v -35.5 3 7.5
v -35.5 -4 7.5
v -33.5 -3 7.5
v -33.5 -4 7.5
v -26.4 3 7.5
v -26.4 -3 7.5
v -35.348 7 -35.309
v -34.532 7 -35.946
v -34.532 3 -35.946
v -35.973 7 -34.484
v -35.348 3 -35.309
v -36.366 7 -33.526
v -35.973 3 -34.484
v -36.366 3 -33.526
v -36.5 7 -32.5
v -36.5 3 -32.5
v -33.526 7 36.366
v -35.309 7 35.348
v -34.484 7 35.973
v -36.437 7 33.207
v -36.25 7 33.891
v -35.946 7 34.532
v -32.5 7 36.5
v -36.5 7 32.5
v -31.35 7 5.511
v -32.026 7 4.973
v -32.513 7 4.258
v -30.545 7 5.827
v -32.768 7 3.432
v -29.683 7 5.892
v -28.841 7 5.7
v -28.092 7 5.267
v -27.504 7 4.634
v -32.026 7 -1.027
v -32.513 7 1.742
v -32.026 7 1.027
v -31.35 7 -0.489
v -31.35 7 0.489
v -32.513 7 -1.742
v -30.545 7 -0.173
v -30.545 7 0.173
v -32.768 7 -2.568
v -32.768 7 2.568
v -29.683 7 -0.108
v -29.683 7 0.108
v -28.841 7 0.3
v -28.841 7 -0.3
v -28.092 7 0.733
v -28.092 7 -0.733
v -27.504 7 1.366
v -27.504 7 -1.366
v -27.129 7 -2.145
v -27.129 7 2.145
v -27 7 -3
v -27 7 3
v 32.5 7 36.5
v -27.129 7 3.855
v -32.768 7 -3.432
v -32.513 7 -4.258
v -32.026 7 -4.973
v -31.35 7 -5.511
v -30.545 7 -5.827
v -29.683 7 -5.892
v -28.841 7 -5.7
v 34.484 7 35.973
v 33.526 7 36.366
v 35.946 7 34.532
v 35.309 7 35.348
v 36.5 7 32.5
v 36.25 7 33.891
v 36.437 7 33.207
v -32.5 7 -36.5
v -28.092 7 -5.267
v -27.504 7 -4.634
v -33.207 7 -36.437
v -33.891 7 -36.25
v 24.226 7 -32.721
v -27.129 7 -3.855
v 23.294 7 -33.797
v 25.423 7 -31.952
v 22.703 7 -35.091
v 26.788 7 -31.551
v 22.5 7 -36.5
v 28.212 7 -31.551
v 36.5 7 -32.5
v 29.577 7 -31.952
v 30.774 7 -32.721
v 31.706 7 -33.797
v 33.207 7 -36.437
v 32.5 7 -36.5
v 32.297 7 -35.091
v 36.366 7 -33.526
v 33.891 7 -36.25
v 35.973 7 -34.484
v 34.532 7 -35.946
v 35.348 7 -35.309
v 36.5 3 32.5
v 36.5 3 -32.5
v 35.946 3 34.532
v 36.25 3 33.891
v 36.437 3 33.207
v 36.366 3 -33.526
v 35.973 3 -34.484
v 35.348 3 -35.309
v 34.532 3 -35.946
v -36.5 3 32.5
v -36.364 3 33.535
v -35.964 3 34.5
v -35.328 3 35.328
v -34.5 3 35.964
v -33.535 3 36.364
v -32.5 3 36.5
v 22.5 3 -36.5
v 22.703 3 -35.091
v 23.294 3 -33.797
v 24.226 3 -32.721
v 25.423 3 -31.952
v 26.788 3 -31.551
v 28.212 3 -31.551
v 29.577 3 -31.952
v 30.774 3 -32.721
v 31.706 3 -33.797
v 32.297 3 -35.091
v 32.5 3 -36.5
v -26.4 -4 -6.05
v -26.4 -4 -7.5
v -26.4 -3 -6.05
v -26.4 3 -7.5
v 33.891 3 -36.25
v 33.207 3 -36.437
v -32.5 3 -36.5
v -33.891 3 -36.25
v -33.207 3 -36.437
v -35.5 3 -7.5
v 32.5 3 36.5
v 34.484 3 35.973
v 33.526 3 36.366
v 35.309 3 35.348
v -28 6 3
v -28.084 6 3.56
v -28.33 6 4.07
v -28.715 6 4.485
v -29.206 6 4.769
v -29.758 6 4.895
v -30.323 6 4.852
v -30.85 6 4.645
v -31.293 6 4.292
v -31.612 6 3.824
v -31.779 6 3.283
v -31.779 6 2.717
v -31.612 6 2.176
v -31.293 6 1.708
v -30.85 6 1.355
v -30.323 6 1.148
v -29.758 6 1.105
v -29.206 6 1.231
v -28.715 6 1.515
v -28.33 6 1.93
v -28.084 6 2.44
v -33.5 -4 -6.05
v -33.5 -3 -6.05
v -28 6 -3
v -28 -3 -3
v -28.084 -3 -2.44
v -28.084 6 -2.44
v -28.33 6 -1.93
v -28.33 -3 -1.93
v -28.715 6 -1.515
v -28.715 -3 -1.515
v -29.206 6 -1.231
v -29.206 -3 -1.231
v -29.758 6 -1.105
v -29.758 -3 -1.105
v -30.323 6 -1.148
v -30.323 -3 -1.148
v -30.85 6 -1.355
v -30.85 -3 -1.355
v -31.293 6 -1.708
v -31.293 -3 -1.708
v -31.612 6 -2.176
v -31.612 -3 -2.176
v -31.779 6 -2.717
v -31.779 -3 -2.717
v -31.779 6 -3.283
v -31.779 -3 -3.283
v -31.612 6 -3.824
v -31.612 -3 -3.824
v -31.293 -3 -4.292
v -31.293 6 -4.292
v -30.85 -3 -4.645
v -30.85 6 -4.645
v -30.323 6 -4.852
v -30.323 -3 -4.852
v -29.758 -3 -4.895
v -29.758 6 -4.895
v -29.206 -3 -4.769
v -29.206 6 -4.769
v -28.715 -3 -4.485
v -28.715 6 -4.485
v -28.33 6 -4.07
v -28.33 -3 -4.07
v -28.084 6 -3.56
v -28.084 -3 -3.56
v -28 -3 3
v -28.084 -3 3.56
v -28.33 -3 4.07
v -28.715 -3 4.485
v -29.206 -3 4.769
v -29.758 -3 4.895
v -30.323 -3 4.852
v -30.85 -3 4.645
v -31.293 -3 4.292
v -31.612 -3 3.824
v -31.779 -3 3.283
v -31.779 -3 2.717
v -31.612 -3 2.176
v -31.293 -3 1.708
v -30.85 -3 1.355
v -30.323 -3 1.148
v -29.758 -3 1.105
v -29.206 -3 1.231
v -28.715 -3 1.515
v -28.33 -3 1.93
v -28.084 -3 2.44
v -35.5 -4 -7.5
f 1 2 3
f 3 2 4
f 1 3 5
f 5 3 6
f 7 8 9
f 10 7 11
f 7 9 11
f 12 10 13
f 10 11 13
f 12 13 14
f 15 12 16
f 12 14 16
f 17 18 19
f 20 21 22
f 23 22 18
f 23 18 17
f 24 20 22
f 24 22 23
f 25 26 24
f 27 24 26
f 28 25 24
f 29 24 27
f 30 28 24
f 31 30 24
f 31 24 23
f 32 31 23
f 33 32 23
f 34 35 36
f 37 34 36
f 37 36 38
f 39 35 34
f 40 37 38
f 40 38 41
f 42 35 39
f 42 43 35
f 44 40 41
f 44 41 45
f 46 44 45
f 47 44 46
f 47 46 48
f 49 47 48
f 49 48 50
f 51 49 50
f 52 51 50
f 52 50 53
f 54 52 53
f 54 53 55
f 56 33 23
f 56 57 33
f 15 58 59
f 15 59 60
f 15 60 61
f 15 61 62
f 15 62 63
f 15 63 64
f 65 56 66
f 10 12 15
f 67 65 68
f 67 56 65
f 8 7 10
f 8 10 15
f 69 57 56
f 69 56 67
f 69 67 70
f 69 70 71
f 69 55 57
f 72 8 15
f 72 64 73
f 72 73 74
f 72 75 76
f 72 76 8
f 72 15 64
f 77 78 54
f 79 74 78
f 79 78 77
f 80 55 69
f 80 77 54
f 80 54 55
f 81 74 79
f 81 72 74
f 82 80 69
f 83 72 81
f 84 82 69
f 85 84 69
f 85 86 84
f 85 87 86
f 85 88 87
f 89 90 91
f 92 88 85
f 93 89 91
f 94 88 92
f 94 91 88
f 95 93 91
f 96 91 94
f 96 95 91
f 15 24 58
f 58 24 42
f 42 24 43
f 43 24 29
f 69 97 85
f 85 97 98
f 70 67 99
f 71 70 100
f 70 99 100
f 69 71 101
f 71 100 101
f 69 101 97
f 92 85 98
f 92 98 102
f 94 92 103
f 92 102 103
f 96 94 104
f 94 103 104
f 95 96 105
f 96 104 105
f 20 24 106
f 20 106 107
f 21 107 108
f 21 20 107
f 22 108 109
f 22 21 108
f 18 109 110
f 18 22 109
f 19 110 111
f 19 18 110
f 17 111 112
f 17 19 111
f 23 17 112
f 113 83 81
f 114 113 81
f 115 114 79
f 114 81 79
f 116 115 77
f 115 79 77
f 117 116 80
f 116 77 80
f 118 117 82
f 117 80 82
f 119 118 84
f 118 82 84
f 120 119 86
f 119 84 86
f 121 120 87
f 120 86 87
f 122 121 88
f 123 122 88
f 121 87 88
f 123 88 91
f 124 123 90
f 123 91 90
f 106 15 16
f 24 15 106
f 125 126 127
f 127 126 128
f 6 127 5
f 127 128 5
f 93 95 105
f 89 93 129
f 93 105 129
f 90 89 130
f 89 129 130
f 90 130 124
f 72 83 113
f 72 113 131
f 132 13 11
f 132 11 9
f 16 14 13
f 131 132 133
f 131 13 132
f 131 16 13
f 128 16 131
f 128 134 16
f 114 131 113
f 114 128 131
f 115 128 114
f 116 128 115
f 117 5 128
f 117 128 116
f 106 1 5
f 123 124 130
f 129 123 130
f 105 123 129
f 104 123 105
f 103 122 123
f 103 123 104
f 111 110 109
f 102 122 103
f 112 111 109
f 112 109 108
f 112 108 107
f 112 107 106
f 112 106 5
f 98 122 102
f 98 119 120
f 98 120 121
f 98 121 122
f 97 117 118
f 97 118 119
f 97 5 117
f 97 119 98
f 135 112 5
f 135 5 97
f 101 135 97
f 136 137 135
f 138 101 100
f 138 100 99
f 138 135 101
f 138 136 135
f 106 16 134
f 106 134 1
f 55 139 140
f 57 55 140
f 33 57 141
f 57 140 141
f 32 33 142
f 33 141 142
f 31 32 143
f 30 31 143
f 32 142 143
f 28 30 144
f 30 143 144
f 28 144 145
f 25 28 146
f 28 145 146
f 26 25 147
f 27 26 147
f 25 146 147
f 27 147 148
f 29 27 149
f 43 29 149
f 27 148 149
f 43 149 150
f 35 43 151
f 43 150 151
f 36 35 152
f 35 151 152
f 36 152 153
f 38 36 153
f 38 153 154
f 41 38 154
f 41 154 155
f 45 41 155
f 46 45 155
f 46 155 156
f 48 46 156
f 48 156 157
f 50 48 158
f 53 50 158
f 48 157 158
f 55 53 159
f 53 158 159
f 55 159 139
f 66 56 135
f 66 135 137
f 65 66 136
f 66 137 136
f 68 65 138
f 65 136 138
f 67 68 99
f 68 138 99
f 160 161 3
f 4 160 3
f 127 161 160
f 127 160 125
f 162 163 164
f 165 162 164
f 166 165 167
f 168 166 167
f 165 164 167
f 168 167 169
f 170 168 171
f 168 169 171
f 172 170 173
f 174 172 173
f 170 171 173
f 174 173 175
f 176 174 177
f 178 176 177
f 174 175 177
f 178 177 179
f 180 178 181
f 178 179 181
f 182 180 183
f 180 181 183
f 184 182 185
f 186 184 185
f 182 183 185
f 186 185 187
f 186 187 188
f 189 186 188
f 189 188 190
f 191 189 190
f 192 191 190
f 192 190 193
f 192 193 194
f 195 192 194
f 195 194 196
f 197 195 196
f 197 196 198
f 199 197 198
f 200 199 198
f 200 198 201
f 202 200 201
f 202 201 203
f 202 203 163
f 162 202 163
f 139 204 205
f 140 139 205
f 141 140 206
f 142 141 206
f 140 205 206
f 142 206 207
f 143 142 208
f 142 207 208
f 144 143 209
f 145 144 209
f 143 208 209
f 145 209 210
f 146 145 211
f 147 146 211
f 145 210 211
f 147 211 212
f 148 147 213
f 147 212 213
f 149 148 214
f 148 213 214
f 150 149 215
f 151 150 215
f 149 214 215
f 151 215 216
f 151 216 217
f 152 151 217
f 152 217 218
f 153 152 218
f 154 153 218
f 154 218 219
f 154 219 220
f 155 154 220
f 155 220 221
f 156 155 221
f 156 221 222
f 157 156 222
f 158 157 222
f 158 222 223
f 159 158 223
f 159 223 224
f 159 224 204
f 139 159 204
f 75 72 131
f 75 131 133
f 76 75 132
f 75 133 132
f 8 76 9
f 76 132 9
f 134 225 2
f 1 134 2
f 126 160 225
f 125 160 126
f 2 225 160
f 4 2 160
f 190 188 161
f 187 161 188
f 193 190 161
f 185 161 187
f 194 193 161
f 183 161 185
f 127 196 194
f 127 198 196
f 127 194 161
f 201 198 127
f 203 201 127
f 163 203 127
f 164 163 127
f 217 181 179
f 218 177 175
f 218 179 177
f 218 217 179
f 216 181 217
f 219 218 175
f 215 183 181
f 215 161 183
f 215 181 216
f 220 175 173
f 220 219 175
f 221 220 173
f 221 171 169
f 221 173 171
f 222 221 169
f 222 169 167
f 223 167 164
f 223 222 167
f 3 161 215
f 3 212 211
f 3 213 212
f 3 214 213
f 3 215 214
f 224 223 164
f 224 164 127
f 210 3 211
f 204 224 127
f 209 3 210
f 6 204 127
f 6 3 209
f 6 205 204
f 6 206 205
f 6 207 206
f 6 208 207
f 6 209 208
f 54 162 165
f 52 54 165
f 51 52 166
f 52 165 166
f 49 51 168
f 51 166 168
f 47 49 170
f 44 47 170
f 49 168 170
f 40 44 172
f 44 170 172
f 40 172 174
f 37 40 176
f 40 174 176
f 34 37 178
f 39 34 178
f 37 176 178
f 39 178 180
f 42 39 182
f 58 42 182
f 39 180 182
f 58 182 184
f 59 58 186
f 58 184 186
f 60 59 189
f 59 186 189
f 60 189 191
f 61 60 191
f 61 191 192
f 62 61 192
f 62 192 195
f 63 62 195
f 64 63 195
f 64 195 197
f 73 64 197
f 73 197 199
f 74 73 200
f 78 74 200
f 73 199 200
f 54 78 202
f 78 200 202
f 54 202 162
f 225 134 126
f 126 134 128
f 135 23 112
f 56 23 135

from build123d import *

# Parameters (mm, degrees)
BOSS_EXTRUDE1_DEPTH = 7
SKETCH2_W           = 44.9
SKETCH2_H           = 67
CUT_EXTRUDE1_DEPTH  = 10
SKETCH3_R           = 1.9
CUT_EXTRUDE2_DEPTH  = 15
CHAMFER1_SIZE       = 1
SKETCH2_3_W         = 2
SKETCH2_3_H         = 15
CUT_EXTRUDE5_DEPTH  = 4
SKETCH7_W           = 2
SKETCH7_H           = 15
BOSS_EXTRUDE2_DEPTH = 1
CUT_EXTRUDE7_DEPTH  = 15
SKETCH11_W          = 7.1
SKETCH11_H          = 26
CUT_EXTRUDE9_DEPTH  = 6
CUT_EXTRUDE10_DEPTH = 10
SKETCH15_W          = 7.1
SKETCH15_H          = 1.45
BOSS_EXTRUDE3_DEPTH = 1


with BuildPart() as part:
    # Sketch1 → Boss-Extrude1 (new body, symmetric)
    with BuildSketch(Plane(origin=(0, 0, 0), x_dir=(1, 0, 0), z_dir=(0, 1, 0))):
        with BuildLine():
            ThreePointArc((-36.5, -32.5), (-36.358942749, -33.552882169), (-35.945719569, -34.531506006))
            Line((-35.945719569, -34.531506006), (0, 1.414213562))
            Line((0, 1.414213562), (-34.531506006, 35.945719569))
            ThreePointArc((-34.531506006, 35.945719569), (-35.973184708, 34.484184464), (-36.5, 32.5))
            Line((-36.5, 32.5), (-36.5, -32.5))
        make_face()
        with BuildLine():
            Line((-34.531506006, 35.945719569), (0, 1.414213562))
            Line((0, 1.414213562), (34.531506006, 35.945719569))
            ThreePointArc((34.531506006, 35.945719569), (33.552882169, 36.358942749), (32.5, 36.5))
            Line((32.5, 36.5), (-32.5, 36.5))
            ThreePointArc((-32.5, 36.5), (-33.552882169, 36.358942749), (-34.531506006, 35.945719569))
        make_face()
        with BuildLine():
            Line((0, 1.414213562), (35.945719569, -34.531506006))
            ThreePointArc((35.945719569, -34.531506006), (36.358942749, -33.552882169), (36.5, -32.5))
            Line((36.5, -32.5), (36.5, 32.5))
            ThreePointArc((36.5, 32.5), (35.973184708, 34.484184464), (34.531506006, 35.945719569))
            Line((34.531506006, 35.945719569), (0, 1.414213562))
        make_face()
        with BuildLine():
            ThreePointArc((-35.945719569, -34.531506006), (-34.484184464, -35.973184708), (-32.5, -36.5))
            Line((-32.5, -36.5), (32.5, -36.5))
            ThreePointArc((32.5, -36.5), (34.484184464, -35.973184708), (35.945719569, -34.531506006))
            Line((35.945719569, -34.531506006), (0, 1.414213562))
            Line((0, 1.414213562), (-35.945719569, -34.531506006))
        make_face()
    extrude(amount=BOSS_EXTRUDE1_DEPTH, both=True)

    # Sketch2 → Cut-Extrude1 (cut)
    with BuildSketch(Plane.XZ.offset(7)):
        with Locations((-3.95, 0)):
            Rectangle(SKETCH2_W, SKETCH2_H)
        with BuildLine():
            Line((18.5, 33.5), (18.5, -33.5))
            Line((18.5, -33.5), (18.5, -36.5))
            Line((18.5, -36.5), (32.5, -36.5))
            ThreePointArc((32.5, -36.5), (35.328427125, -35.328427125), (36.5, -32.5))
            Line((36.5, -32.5), (36.5, 32.5))
            ThreePointArc((36.5, 32.5), (35.328427125, 35.328427125), (32.5, 36.5))
            Line((32.5, 36.5), (18.5, 36.5))
            Line((18.5, 36.5), (18.5, 33.5))
        make_face()
    extrude(amount=-CUT_EXTRUDE1_DEPTH, mode=Mode.SUBTRACT)

    # Sketch3 → Cut-Extrude2 (cut, through all)
    with BuildSketch(Plane.XZ.offset(7)):
        with Locations((-29.9, 3)):
            Circle(SKETCH3_R)
        with Locations((-29.9, -3)):
            Circle(SKETCH3_R)
    extrude(amount=-CUT_EXTRUDE2_DEPTH, mode=Mode.SUBTRACT)

    # Chamfer1
    chamfer1_edges = [part.edges().sort_by_distance(p)[0] for p in [
        (-31.8, 7, 3),
        (-31.8, 7, -3),
    ]]
    chamfer(chamfer1_edges, length=CHAMFER1_SIZE)

    # Sketch2<3> → Cut-Extrude5 (cut)
    with BuildSketch(Plane.XZ.offset(7)):
        Polygon((-33.5, -7.5), (-33.5, -33.5), (-26.4, -33.5), (-26.4, 33.5), (-33.5, 33.5), (-33.5, 7.5), align=None)
        with Locations((-34.5, 0)):
            Rectangle(SKETCH2_3_W, SKETCH2_3_H)
    extrude(amount=-CUT_EXTRUDE5_DEPTH, mode=Mode.SUBTRACT)

    # Sketch7 → Boss-Extrude2 (add)
    with BuildSketch(Plane.XZ.offset(3)):
        with Locations((-34.5, 0)):
            Rectangle(SKETCH7_W, SKETCH7_H)
    extrude(amount=BOSS_EXTRUDE2_DEPTH)

    # Sketch9 → Cut-Extrude7 (cut, through all)
    with BuildSketch(Plane(origin=(0, 7, 0), x_dir=(1, 0, 0), z_dir=(0, 1, 0))):
        with BuildLine():
            Line((32.5, 36.5), (22.5, 36.5))
            ThreePointArc((22.5, 36.5), (27.5, 31.5), (32.5, 36.5))
        make_face()
    extrude(amount=-CUT_EXTRUDE7_DEPTH, mode=Mode.SUBTRACT)

    # Sketch11 → Cut-Extrude9 (cut)
    with BuildSketch(Plane.XZ.offset(3)):
        with Locations((-29.95, 20.5)):
            Rectangle(SKETCH11_W, SKETCH11_H)
        with Locations((-29.95, -20.5)):
            Rectangle(SKETCH11_W, SKETCH11_H)
    extrude(amount=-CUT_EXTRUDE9_DEPTH, mode=Mode.SUBTRACT)

    # Sketch13 → Cut-Extrude10 (cut)
    with BuildSketch(Plane.XZ.offset(7)):
        with BuildLine():
            Line((-32.5, -36.5), (18.5, -36.5))
            Line((18.5, -36.5), (18.5, -33.5))
            Line((18.5, -33.5), (-33.5, -33.5))
            Line((-33.5, -33.5), (-33.5, -7.5))
            Line((-33.5, -7.5), (-35.5, -7.5))
            Line((-35.5, -7.5), (-35.5, 7.5))
            Line((-35.5, 7.5), (-33.5, 7.5))
            Line((-33.5, 7.5), (-33.5, 33.5))
            Line((-33.5, 33.5), (18.5, 33.5))
            Line((18.5, 33.5), (18.5, 36.5))
            Line((18.5, 36.5), (-32.5, 36.5))
            ThreePointArc((-32.5, 36.5), (-35.328427125, 35.328427125), (-36.5, 32.5))
            Line((-36.5, 32.5), (-36.5, -32.5))
            ThreePointArc((-36.5, -32.5), (-35.328427125, -35.328427125), (-32.5, -36.5))
        make_face()
    extrude(amount=-CUT_EXTRUDE10_DEPTH, mode=Mode.SUBTRACT)

    # Sketch15 → Boss-Extrude3 (add)
    with BuildSketch(Plane.XZ.offset(3)):
        with Locations((-29.95, -6.775)):
            Rectangle(SKETCH15_W, SKETCH15_H)
    extrude(amount=BOSS_EXTRUDE3_DEPTH)


solid = part.part
